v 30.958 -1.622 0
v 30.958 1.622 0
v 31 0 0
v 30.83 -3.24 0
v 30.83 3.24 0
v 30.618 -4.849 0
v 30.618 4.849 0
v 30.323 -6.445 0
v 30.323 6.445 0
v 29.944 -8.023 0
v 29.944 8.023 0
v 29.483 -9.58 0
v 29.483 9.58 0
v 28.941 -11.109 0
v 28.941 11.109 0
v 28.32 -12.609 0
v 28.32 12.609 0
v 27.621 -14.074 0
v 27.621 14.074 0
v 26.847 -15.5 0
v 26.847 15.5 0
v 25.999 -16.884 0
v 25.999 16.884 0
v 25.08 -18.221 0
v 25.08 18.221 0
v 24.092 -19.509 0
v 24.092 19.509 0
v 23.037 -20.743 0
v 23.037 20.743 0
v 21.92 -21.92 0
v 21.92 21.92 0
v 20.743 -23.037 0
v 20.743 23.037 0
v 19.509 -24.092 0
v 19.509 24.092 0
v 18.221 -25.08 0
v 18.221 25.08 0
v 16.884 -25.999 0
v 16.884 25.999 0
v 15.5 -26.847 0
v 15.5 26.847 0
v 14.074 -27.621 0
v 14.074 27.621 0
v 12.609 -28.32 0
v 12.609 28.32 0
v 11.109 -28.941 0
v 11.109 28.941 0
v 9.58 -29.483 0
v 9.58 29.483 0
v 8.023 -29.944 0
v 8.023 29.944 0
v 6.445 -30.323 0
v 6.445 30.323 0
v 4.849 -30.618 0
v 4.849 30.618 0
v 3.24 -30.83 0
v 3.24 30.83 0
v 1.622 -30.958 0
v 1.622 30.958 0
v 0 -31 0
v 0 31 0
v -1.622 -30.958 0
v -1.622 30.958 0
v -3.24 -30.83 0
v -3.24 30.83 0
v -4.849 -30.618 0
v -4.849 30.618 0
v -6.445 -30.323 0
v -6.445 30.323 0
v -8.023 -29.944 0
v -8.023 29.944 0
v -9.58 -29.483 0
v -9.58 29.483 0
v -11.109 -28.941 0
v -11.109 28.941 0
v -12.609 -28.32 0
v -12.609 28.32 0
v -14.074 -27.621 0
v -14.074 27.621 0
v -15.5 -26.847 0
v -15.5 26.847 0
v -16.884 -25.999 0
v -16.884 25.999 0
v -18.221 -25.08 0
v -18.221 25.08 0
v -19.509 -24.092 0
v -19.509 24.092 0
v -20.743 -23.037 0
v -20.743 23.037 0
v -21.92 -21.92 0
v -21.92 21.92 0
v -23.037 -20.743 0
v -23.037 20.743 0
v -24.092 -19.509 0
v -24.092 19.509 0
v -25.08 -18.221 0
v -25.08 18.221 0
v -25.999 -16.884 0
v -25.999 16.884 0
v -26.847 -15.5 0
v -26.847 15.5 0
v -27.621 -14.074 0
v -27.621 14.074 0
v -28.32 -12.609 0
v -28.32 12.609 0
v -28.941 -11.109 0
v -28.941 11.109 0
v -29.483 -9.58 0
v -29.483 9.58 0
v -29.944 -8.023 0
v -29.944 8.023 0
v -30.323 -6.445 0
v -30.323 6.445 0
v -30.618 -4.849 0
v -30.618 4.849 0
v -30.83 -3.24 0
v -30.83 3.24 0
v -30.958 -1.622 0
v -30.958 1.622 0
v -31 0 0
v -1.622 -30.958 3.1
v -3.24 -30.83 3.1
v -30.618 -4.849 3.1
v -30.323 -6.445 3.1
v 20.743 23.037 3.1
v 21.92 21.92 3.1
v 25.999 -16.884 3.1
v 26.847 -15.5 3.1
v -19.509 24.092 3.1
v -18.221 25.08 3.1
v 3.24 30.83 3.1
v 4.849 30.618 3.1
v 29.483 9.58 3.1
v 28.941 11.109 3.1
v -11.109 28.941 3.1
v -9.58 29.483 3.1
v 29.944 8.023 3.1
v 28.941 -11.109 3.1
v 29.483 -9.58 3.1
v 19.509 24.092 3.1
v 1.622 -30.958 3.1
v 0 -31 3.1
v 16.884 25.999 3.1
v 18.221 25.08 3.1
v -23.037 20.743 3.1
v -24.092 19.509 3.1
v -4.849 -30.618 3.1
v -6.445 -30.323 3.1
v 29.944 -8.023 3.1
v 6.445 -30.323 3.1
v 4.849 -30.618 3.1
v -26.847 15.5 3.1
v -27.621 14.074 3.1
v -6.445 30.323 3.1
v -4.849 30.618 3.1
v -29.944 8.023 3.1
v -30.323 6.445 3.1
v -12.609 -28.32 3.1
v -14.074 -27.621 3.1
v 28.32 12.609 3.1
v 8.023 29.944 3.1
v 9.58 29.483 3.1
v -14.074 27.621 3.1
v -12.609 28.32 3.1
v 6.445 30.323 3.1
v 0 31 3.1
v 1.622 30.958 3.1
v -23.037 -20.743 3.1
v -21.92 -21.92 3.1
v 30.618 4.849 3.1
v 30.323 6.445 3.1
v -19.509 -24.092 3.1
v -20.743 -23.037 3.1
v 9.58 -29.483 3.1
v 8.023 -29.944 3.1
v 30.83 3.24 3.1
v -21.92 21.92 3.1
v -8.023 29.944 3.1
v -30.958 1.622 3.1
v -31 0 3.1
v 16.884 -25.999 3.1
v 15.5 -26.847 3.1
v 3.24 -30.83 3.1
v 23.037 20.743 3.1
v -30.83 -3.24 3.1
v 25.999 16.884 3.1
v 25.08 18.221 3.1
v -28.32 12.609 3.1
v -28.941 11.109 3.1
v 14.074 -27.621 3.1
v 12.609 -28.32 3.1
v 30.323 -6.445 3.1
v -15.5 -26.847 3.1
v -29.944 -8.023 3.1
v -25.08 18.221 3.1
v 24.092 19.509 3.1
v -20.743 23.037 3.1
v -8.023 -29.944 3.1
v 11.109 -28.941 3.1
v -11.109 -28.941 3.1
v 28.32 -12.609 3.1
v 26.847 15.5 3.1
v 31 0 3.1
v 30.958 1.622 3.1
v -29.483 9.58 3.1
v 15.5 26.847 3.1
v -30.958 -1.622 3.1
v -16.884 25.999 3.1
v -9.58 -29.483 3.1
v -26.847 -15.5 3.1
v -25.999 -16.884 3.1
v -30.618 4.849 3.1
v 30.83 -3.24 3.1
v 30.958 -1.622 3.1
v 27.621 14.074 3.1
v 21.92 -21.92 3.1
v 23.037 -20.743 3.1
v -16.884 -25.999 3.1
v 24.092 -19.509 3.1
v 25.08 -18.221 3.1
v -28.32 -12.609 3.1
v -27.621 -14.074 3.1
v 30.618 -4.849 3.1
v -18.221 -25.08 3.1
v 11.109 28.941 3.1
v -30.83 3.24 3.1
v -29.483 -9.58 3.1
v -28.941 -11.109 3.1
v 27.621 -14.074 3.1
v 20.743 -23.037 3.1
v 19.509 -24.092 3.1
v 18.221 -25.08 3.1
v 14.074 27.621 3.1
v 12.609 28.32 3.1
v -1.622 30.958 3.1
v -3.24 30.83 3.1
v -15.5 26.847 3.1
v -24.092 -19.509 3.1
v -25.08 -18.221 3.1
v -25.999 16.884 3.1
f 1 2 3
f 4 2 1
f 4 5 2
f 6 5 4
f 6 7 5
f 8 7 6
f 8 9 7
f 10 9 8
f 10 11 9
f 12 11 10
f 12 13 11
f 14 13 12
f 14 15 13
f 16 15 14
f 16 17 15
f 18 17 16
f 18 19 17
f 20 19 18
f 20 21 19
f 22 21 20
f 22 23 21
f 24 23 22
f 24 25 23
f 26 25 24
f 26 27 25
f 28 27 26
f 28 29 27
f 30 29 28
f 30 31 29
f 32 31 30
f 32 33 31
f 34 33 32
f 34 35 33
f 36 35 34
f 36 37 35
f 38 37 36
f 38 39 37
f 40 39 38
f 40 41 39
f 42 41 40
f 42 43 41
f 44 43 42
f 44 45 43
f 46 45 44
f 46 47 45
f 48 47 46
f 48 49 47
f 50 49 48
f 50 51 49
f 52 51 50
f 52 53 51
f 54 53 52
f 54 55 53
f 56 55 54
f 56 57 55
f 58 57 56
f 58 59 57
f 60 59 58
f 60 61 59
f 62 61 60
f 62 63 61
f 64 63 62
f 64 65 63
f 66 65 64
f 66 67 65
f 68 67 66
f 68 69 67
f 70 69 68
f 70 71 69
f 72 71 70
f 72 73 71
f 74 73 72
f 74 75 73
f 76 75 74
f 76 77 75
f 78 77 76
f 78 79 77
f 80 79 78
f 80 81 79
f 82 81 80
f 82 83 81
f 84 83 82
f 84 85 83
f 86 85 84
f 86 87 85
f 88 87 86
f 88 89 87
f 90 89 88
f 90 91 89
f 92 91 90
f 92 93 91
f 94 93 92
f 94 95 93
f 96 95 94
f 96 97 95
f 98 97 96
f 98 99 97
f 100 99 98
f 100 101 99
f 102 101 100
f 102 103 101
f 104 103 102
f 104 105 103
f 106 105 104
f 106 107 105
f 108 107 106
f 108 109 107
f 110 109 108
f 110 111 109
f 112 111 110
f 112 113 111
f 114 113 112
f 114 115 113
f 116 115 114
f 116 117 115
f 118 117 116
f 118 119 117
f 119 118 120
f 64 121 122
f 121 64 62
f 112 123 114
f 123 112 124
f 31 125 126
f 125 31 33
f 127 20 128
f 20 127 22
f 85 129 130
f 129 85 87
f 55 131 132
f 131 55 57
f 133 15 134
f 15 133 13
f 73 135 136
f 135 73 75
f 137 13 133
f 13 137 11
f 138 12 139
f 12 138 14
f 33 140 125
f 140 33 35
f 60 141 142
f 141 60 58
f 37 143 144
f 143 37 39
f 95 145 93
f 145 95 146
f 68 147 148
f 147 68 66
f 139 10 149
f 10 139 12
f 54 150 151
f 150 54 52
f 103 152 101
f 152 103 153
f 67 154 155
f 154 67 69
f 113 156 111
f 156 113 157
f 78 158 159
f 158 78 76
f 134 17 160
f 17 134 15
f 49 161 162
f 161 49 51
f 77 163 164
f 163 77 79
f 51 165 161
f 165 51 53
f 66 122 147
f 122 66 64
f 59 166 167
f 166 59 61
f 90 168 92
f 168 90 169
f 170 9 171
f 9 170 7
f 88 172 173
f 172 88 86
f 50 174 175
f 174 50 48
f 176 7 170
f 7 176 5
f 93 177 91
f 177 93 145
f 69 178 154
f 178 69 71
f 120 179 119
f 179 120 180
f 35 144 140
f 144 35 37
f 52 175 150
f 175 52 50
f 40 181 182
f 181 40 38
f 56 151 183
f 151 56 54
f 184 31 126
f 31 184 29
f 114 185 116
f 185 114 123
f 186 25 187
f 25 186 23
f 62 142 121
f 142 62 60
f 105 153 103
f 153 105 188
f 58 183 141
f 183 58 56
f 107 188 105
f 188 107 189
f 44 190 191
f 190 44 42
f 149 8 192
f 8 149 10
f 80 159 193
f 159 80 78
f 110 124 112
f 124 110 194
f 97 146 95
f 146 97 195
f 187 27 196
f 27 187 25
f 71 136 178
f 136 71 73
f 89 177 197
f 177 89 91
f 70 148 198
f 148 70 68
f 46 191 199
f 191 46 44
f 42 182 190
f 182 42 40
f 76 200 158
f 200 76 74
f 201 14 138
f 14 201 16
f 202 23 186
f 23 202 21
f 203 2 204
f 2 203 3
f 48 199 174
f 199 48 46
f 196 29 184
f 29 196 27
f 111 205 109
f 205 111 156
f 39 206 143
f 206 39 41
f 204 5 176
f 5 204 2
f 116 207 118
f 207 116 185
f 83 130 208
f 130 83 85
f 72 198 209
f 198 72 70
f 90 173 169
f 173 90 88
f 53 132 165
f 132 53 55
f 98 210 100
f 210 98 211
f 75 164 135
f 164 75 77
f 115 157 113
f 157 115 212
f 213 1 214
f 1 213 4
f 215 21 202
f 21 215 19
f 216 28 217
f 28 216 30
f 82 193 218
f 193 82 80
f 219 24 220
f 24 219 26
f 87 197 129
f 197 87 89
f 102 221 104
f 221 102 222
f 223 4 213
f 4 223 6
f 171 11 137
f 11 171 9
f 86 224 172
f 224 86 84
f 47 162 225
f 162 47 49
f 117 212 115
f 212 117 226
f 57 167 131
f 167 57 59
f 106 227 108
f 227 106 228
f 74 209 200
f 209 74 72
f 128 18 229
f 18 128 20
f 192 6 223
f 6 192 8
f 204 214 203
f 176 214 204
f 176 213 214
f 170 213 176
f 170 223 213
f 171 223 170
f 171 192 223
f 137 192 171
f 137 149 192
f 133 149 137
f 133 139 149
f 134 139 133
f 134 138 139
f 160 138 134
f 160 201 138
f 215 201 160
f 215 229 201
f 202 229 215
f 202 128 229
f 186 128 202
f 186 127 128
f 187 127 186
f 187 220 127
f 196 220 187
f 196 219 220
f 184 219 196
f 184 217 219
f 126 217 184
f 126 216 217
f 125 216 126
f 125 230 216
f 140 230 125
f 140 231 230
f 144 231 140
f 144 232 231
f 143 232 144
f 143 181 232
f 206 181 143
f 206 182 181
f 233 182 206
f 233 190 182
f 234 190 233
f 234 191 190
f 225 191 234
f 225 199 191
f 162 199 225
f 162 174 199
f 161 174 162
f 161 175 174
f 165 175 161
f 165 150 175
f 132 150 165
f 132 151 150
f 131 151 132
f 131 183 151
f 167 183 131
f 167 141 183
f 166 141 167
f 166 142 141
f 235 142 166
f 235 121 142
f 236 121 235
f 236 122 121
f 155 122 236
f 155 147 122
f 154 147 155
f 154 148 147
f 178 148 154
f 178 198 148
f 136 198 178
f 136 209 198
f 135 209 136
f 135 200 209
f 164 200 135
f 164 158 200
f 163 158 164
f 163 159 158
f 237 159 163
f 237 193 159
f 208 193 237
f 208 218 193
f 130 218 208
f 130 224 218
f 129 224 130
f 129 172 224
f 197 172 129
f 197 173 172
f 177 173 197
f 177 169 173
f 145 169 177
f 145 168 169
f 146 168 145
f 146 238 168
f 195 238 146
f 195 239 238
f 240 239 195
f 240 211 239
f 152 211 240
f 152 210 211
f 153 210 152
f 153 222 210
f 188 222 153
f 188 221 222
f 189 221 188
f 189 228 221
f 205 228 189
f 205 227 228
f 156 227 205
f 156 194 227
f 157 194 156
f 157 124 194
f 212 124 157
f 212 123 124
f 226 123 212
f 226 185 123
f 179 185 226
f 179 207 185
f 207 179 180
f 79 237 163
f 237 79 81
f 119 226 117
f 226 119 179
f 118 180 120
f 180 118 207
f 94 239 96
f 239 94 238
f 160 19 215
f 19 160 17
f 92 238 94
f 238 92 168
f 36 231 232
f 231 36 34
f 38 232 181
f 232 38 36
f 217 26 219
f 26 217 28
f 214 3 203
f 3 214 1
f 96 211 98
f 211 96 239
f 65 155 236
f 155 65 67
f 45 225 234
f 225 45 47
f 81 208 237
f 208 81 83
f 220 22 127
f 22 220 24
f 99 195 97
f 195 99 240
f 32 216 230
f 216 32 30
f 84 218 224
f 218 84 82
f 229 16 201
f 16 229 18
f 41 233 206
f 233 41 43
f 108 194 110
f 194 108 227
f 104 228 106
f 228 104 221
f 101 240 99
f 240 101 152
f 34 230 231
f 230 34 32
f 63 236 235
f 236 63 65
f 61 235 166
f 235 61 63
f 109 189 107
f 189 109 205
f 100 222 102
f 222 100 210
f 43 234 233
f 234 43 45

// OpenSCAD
// file: orb_config.scad
// ============================================================
// Orb V9 — 全局参数（OpenSCAD 版本）
//
// V9 核心改进（对比 V8）：
//   1. 尺寸: Ø98mm → Ø112mm（桌面更有存在感）
//   2. 曲面: 连续椭球体 (x/56)²+(z/43)²=1，完全无拼接
//   3. 顶盖: 浮岛结构 Ø92mm × 6mm，0.6mm 缝隙呼吸口
//   4. 灯环: 隐藏式 4mm 磨砂扩散罩
//   5. 装配: 5 件式（卡扣 + M2×6 螺丝 ×4）
//
// 比例: H/W = 0.77（蛋形桌面情绪物件）
// ============================================================

// ─── 整机 ─────────────────────────────────────────────────
orb_diameter     = 112;
orb_height       = 86;
rx               = 56;           // 椭球 X 半径
ry               = 43;           // 椭球 Y（Z轴）半径
wall             = 2.2;

// ─── 分割 ─────────────────────────────────────────────────
split_z          = 44;           // 上下壳分割高度
ring_h           = 4;            // 灯环高度
ring_t           = 1.5;          // 灯环壁厚

// ─── 顶盖 ─────────────────────────────────────────────────
cap_d            = 92;           // 浮岛顶盖直径
cap_h            = 6;            // 顶盖厚度
cap_gap          = 0.6;          // 缝隙：麦克风孔 + 灯光溢出
cap_fillet       = 4;            // 顶盖圆角

// ─── 底盖 ─────────────────────────────────────────────────
base_d           = 62;           // 底面直径
base_h           = 3;            // 底盖厚度
base_fillet      = 8;            // 底部圆角

// ─── LED 灯环 ─────────────────────────────────────────────
led_count_main   = 16;           // 主灯环
led_count_halo   = 8;            // 底部 Halo
led_total        = led_count_main + led_count_halo;
led_slot_r       = 2.8;

// ─── 麦克风 ───────────────────────────────────────────────
mic_count        = 4;
mic_spacing      = 42;           // 麦克风间距
mic_hole_d       = 1;
mic_ring_r       = 21;           // 麦克风孔环半径

// ─── PCB ──────────────────────────────────────────────────
pcb_d            = 55;
pcb_thick        = 1.6;

// ─── 装配 ─────────────────────────────────────────────────
screw_d          = 2.2;          // M2 + 间隙
screw_boss_d     = 5;
n_screws         = 4;
screw_ring_r     = 24;

// ─── 渲染精度 ─────────────────────────────────────────────
$fn              = 120;

// ─── 椭球半径函数 ─────────────────────────────────────────
// 给定 z 高度（0..orb_height），返回该高度的截面半径
// 椭球中心在 z=ry，方程: (r/rx)² + ((z-ry)/ry)² = 1
function v9_r(z) =
    let(t = (z - ry) / ry)
    (abs(t) > 1) ? 0 : rx * sqrt(1 - t * t);
// main file
// ============================================================
// Orb V9 — 底盖（Base）
// Ø62mm × 3mm，R8 圆角，硅胶防滑垫平面
// ============================================================
include <orb_config.scad>

module base() {
    // 用 hull 做圆角底盖
    hull() {
        // 底面主体
        cylinder(h=0.1, d=base_d);
        // 顶面缩进（模拟圆角过渡）
        translate([0, 0, base_h])
            cylinder(h=0.1, d=base_d);
    }

    // 硅胶垫定位槽（浅环形凹槽）
    difference() {
        cylinder(h=0.5, d=base_d - 4);
        translate([0, 0, -0.1])
            cylinder(h=0.7, d=base_d - 8);
    }
}

base();
